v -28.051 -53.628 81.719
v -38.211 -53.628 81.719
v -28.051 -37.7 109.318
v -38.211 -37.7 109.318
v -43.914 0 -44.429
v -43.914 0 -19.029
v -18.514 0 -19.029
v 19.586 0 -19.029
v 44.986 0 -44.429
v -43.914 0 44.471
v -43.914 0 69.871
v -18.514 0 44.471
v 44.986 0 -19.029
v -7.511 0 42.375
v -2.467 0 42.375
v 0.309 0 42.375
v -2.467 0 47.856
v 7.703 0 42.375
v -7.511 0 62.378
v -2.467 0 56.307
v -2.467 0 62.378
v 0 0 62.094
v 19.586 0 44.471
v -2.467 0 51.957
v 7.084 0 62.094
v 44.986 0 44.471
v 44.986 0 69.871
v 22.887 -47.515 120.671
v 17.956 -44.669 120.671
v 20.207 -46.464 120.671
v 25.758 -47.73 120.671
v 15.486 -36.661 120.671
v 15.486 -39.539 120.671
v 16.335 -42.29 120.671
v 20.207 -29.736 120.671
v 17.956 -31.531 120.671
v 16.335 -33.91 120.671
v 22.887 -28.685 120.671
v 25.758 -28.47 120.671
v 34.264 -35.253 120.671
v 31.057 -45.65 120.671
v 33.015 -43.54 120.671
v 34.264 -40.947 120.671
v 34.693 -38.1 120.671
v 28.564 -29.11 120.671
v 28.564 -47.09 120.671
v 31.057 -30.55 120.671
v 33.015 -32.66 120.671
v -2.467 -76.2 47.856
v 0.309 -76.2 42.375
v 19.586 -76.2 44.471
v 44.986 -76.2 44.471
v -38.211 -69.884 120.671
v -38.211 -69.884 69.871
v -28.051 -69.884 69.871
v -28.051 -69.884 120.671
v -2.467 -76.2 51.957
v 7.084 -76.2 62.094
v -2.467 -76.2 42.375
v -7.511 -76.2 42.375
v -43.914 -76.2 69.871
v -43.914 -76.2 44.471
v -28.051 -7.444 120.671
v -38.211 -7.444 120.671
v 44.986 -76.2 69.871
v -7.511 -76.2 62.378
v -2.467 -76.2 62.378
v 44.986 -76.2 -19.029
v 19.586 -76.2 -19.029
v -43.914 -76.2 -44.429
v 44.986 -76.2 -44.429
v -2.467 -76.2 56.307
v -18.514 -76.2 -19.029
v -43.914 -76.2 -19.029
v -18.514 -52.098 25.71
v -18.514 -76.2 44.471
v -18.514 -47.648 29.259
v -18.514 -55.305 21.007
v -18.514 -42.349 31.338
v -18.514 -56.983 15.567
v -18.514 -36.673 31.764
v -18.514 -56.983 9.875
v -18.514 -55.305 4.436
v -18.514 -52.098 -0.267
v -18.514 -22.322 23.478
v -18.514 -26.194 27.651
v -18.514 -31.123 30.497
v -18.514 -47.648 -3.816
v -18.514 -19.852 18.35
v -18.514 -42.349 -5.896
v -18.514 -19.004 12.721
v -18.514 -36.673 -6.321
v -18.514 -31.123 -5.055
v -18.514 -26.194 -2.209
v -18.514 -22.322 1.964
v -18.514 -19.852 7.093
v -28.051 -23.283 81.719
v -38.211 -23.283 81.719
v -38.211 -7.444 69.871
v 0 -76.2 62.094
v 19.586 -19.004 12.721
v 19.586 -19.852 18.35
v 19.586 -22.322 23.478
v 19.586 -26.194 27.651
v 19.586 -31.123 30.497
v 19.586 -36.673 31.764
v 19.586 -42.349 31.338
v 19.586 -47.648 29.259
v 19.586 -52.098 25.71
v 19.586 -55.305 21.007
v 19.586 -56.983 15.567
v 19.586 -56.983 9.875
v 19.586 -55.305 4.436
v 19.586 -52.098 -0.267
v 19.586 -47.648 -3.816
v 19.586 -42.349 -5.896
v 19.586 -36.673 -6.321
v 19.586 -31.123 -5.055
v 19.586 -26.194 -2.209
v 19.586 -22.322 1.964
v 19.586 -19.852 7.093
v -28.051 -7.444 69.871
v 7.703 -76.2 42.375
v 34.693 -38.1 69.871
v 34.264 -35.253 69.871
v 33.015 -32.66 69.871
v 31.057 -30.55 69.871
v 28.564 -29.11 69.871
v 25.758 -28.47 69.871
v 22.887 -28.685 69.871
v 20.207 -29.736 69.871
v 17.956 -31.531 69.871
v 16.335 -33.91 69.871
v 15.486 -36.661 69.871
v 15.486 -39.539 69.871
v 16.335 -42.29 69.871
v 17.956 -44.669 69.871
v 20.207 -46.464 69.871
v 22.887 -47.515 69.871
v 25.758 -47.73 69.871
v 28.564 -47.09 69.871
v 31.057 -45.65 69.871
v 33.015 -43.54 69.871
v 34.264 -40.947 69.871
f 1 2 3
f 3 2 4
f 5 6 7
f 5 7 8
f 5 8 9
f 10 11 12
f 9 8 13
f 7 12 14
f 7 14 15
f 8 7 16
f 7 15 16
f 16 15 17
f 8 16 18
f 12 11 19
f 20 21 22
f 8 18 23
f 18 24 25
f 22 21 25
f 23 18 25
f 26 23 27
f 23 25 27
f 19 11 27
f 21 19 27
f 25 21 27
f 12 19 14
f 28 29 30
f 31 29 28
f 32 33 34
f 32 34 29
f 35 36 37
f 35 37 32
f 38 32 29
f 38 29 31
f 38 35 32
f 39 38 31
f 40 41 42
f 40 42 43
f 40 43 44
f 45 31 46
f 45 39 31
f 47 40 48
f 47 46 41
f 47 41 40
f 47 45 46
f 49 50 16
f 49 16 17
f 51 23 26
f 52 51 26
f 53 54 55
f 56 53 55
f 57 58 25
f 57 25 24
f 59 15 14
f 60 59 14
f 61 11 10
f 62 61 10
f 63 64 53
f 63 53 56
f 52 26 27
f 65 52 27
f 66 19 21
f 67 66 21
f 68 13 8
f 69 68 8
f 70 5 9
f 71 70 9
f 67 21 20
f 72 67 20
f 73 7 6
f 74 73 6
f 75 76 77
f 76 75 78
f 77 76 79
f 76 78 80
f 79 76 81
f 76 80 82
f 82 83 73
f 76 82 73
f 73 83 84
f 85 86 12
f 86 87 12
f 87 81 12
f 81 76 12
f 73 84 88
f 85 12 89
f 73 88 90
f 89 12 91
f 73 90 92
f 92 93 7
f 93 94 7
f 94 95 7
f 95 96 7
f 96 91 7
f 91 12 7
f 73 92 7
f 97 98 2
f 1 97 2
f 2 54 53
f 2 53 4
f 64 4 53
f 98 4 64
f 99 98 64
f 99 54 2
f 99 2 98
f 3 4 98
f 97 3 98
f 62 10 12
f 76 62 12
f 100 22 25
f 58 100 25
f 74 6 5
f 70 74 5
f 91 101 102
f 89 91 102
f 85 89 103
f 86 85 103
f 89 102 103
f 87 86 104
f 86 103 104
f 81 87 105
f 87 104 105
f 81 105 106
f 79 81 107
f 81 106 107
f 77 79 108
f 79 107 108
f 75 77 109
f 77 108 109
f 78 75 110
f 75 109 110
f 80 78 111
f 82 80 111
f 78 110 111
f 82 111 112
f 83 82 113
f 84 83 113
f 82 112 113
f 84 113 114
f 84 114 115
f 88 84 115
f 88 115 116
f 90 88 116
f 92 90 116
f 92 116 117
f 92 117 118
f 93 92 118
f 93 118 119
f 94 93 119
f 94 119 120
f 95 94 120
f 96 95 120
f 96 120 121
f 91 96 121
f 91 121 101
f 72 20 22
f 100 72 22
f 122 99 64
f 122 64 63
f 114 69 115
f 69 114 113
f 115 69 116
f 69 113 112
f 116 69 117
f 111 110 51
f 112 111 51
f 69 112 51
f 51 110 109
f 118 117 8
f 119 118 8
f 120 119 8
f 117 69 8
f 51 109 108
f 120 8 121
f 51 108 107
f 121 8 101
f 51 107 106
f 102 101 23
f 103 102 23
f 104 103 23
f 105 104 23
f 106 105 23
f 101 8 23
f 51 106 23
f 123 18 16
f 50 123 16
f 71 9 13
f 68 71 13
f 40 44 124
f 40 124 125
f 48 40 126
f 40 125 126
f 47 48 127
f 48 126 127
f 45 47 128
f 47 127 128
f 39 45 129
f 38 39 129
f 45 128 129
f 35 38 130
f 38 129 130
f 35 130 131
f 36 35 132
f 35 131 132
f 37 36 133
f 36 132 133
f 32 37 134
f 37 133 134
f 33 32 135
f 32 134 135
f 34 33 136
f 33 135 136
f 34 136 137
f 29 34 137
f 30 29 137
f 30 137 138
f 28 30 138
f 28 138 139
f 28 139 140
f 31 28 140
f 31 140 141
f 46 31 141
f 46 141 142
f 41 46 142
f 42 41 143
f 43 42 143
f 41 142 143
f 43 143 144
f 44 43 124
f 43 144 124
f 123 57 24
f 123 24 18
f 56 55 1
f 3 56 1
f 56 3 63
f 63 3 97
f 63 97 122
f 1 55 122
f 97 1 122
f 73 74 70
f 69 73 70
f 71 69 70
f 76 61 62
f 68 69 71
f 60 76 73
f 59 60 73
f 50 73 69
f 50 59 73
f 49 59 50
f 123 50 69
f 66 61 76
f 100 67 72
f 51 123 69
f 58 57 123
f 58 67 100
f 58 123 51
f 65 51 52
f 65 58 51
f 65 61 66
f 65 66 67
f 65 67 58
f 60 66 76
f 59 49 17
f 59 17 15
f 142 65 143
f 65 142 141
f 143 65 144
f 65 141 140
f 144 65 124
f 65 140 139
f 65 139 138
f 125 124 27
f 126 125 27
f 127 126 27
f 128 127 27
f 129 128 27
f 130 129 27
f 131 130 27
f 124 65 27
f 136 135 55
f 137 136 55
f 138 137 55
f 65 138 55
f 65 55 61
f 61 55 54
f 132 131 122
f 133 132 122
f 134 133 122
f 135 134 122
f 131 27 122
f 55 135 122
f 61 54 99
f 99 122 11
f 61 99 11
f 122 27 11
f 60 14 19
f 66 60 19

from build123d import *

# Parameters (mm, degrees)
F1_DEPTH  = 76.2
F2_R      = 19.096035609
F3_DEPTH  = 47.498
F4_W      = 10.16
F4_H      = 62.4394440092
F5_DEPTH  = 50.8
F7_DEPTH  = 25.4
F9_DEPTH  = 96.52
F10_R     = 9.6573764136
F11_DEPTH = 50.8


# Not quite as in the source:
# - a feature names something its author has since deleted; it is built from what else it names


with BuildPart() as f1:
    # F0 (on Front) → F1 (new body)
    with BuildSketch(Plane.XZ):
        Polygon((-43.9144560635, -19.0287967878), (-43.9144560635, -44.4287967878), (44.9855439365, -44.4287967878), (44.9855439365, -19.0287967878), (19.5855439365, -19.0287967878), (19.5855439365, 44.4712032122), (44.9855439365, 44.4712032122), (44.9855439365, 69.8712032122), (-43.9144560635, 69.8712032122), (-43.9144560635, 44.4712032122), (-18.5144560635, 44.4712032122), (-18.5144560635, -19.0287967878), align=None)
    extrude(amount=F1_DEPTH)

    # F2 (on face) → F3 (cut)
    with BuildSketch(Plane.YZ.offset(19.5855439365)):
        with Locations((-38.1, 12.7212032122)):
            Circle(F2_R)
    extrude(amount=-F3_DEPTH, mode=Mode.SUBTRACT)

    # F4 (on face) → F5 (join)
    with BuildSketch(Plane.XY.offset(69.8712032122)):
        with Locations((-33.1311938035, -38.6642131489)):
            Rectangle(F4_W, F4_H)
    extrude(amount=F5_DEPTH)

    # F6 (on face) → F7 (cut)
    with BuildSketch(Plane(origin=(-38.2111938035, 0, 0), x_dir=(0, -1, 0), z_dir=(-1, 0, 0))):
        Polygon((53.6283701658, 81.7187428474), (37.7003215253, 109.3182116747), (23.2826862484, 81.7187428474), align=None)
    extrude(amount=-F7_DEPTH, mode=Mode.SUBTRACT)

    # F8 (on face) → F9 (cut)
    with BuildSketch(Plane(origin=(0, 0, 0), x_dir=(-1, 0, 0), z_dir=(0, 1, 0))):
        Polygon((7.511020638, 42.3752516508), (7.511020638, 62.378142029), (2.4668793194, 62.378142029), (2.4668793194, 56.307456918), (0, 62.0944574475), (-7.0838662127, 62.0944574475), (2.4668793194, 51.9569911986), (-7.7034849674, 42.3752516508), (-0.3085337383, 42.3752516508), (2.4668793194, 47.8559471667), (2.4668793194, 42.3752516508), align=None)
    extrude(amount=-F9_DEPTH, mode=Mode.SUBTRACT)

    # F10 (on face) → F11 (join)
    with BuildSketch(Plane.XY.offset(69.8712032122)):
        with Locations((25.0358451158, -38.1)):
            Circle(F10_R)
    extrude(amount=F11_DEPTH)


solid = f1.part
